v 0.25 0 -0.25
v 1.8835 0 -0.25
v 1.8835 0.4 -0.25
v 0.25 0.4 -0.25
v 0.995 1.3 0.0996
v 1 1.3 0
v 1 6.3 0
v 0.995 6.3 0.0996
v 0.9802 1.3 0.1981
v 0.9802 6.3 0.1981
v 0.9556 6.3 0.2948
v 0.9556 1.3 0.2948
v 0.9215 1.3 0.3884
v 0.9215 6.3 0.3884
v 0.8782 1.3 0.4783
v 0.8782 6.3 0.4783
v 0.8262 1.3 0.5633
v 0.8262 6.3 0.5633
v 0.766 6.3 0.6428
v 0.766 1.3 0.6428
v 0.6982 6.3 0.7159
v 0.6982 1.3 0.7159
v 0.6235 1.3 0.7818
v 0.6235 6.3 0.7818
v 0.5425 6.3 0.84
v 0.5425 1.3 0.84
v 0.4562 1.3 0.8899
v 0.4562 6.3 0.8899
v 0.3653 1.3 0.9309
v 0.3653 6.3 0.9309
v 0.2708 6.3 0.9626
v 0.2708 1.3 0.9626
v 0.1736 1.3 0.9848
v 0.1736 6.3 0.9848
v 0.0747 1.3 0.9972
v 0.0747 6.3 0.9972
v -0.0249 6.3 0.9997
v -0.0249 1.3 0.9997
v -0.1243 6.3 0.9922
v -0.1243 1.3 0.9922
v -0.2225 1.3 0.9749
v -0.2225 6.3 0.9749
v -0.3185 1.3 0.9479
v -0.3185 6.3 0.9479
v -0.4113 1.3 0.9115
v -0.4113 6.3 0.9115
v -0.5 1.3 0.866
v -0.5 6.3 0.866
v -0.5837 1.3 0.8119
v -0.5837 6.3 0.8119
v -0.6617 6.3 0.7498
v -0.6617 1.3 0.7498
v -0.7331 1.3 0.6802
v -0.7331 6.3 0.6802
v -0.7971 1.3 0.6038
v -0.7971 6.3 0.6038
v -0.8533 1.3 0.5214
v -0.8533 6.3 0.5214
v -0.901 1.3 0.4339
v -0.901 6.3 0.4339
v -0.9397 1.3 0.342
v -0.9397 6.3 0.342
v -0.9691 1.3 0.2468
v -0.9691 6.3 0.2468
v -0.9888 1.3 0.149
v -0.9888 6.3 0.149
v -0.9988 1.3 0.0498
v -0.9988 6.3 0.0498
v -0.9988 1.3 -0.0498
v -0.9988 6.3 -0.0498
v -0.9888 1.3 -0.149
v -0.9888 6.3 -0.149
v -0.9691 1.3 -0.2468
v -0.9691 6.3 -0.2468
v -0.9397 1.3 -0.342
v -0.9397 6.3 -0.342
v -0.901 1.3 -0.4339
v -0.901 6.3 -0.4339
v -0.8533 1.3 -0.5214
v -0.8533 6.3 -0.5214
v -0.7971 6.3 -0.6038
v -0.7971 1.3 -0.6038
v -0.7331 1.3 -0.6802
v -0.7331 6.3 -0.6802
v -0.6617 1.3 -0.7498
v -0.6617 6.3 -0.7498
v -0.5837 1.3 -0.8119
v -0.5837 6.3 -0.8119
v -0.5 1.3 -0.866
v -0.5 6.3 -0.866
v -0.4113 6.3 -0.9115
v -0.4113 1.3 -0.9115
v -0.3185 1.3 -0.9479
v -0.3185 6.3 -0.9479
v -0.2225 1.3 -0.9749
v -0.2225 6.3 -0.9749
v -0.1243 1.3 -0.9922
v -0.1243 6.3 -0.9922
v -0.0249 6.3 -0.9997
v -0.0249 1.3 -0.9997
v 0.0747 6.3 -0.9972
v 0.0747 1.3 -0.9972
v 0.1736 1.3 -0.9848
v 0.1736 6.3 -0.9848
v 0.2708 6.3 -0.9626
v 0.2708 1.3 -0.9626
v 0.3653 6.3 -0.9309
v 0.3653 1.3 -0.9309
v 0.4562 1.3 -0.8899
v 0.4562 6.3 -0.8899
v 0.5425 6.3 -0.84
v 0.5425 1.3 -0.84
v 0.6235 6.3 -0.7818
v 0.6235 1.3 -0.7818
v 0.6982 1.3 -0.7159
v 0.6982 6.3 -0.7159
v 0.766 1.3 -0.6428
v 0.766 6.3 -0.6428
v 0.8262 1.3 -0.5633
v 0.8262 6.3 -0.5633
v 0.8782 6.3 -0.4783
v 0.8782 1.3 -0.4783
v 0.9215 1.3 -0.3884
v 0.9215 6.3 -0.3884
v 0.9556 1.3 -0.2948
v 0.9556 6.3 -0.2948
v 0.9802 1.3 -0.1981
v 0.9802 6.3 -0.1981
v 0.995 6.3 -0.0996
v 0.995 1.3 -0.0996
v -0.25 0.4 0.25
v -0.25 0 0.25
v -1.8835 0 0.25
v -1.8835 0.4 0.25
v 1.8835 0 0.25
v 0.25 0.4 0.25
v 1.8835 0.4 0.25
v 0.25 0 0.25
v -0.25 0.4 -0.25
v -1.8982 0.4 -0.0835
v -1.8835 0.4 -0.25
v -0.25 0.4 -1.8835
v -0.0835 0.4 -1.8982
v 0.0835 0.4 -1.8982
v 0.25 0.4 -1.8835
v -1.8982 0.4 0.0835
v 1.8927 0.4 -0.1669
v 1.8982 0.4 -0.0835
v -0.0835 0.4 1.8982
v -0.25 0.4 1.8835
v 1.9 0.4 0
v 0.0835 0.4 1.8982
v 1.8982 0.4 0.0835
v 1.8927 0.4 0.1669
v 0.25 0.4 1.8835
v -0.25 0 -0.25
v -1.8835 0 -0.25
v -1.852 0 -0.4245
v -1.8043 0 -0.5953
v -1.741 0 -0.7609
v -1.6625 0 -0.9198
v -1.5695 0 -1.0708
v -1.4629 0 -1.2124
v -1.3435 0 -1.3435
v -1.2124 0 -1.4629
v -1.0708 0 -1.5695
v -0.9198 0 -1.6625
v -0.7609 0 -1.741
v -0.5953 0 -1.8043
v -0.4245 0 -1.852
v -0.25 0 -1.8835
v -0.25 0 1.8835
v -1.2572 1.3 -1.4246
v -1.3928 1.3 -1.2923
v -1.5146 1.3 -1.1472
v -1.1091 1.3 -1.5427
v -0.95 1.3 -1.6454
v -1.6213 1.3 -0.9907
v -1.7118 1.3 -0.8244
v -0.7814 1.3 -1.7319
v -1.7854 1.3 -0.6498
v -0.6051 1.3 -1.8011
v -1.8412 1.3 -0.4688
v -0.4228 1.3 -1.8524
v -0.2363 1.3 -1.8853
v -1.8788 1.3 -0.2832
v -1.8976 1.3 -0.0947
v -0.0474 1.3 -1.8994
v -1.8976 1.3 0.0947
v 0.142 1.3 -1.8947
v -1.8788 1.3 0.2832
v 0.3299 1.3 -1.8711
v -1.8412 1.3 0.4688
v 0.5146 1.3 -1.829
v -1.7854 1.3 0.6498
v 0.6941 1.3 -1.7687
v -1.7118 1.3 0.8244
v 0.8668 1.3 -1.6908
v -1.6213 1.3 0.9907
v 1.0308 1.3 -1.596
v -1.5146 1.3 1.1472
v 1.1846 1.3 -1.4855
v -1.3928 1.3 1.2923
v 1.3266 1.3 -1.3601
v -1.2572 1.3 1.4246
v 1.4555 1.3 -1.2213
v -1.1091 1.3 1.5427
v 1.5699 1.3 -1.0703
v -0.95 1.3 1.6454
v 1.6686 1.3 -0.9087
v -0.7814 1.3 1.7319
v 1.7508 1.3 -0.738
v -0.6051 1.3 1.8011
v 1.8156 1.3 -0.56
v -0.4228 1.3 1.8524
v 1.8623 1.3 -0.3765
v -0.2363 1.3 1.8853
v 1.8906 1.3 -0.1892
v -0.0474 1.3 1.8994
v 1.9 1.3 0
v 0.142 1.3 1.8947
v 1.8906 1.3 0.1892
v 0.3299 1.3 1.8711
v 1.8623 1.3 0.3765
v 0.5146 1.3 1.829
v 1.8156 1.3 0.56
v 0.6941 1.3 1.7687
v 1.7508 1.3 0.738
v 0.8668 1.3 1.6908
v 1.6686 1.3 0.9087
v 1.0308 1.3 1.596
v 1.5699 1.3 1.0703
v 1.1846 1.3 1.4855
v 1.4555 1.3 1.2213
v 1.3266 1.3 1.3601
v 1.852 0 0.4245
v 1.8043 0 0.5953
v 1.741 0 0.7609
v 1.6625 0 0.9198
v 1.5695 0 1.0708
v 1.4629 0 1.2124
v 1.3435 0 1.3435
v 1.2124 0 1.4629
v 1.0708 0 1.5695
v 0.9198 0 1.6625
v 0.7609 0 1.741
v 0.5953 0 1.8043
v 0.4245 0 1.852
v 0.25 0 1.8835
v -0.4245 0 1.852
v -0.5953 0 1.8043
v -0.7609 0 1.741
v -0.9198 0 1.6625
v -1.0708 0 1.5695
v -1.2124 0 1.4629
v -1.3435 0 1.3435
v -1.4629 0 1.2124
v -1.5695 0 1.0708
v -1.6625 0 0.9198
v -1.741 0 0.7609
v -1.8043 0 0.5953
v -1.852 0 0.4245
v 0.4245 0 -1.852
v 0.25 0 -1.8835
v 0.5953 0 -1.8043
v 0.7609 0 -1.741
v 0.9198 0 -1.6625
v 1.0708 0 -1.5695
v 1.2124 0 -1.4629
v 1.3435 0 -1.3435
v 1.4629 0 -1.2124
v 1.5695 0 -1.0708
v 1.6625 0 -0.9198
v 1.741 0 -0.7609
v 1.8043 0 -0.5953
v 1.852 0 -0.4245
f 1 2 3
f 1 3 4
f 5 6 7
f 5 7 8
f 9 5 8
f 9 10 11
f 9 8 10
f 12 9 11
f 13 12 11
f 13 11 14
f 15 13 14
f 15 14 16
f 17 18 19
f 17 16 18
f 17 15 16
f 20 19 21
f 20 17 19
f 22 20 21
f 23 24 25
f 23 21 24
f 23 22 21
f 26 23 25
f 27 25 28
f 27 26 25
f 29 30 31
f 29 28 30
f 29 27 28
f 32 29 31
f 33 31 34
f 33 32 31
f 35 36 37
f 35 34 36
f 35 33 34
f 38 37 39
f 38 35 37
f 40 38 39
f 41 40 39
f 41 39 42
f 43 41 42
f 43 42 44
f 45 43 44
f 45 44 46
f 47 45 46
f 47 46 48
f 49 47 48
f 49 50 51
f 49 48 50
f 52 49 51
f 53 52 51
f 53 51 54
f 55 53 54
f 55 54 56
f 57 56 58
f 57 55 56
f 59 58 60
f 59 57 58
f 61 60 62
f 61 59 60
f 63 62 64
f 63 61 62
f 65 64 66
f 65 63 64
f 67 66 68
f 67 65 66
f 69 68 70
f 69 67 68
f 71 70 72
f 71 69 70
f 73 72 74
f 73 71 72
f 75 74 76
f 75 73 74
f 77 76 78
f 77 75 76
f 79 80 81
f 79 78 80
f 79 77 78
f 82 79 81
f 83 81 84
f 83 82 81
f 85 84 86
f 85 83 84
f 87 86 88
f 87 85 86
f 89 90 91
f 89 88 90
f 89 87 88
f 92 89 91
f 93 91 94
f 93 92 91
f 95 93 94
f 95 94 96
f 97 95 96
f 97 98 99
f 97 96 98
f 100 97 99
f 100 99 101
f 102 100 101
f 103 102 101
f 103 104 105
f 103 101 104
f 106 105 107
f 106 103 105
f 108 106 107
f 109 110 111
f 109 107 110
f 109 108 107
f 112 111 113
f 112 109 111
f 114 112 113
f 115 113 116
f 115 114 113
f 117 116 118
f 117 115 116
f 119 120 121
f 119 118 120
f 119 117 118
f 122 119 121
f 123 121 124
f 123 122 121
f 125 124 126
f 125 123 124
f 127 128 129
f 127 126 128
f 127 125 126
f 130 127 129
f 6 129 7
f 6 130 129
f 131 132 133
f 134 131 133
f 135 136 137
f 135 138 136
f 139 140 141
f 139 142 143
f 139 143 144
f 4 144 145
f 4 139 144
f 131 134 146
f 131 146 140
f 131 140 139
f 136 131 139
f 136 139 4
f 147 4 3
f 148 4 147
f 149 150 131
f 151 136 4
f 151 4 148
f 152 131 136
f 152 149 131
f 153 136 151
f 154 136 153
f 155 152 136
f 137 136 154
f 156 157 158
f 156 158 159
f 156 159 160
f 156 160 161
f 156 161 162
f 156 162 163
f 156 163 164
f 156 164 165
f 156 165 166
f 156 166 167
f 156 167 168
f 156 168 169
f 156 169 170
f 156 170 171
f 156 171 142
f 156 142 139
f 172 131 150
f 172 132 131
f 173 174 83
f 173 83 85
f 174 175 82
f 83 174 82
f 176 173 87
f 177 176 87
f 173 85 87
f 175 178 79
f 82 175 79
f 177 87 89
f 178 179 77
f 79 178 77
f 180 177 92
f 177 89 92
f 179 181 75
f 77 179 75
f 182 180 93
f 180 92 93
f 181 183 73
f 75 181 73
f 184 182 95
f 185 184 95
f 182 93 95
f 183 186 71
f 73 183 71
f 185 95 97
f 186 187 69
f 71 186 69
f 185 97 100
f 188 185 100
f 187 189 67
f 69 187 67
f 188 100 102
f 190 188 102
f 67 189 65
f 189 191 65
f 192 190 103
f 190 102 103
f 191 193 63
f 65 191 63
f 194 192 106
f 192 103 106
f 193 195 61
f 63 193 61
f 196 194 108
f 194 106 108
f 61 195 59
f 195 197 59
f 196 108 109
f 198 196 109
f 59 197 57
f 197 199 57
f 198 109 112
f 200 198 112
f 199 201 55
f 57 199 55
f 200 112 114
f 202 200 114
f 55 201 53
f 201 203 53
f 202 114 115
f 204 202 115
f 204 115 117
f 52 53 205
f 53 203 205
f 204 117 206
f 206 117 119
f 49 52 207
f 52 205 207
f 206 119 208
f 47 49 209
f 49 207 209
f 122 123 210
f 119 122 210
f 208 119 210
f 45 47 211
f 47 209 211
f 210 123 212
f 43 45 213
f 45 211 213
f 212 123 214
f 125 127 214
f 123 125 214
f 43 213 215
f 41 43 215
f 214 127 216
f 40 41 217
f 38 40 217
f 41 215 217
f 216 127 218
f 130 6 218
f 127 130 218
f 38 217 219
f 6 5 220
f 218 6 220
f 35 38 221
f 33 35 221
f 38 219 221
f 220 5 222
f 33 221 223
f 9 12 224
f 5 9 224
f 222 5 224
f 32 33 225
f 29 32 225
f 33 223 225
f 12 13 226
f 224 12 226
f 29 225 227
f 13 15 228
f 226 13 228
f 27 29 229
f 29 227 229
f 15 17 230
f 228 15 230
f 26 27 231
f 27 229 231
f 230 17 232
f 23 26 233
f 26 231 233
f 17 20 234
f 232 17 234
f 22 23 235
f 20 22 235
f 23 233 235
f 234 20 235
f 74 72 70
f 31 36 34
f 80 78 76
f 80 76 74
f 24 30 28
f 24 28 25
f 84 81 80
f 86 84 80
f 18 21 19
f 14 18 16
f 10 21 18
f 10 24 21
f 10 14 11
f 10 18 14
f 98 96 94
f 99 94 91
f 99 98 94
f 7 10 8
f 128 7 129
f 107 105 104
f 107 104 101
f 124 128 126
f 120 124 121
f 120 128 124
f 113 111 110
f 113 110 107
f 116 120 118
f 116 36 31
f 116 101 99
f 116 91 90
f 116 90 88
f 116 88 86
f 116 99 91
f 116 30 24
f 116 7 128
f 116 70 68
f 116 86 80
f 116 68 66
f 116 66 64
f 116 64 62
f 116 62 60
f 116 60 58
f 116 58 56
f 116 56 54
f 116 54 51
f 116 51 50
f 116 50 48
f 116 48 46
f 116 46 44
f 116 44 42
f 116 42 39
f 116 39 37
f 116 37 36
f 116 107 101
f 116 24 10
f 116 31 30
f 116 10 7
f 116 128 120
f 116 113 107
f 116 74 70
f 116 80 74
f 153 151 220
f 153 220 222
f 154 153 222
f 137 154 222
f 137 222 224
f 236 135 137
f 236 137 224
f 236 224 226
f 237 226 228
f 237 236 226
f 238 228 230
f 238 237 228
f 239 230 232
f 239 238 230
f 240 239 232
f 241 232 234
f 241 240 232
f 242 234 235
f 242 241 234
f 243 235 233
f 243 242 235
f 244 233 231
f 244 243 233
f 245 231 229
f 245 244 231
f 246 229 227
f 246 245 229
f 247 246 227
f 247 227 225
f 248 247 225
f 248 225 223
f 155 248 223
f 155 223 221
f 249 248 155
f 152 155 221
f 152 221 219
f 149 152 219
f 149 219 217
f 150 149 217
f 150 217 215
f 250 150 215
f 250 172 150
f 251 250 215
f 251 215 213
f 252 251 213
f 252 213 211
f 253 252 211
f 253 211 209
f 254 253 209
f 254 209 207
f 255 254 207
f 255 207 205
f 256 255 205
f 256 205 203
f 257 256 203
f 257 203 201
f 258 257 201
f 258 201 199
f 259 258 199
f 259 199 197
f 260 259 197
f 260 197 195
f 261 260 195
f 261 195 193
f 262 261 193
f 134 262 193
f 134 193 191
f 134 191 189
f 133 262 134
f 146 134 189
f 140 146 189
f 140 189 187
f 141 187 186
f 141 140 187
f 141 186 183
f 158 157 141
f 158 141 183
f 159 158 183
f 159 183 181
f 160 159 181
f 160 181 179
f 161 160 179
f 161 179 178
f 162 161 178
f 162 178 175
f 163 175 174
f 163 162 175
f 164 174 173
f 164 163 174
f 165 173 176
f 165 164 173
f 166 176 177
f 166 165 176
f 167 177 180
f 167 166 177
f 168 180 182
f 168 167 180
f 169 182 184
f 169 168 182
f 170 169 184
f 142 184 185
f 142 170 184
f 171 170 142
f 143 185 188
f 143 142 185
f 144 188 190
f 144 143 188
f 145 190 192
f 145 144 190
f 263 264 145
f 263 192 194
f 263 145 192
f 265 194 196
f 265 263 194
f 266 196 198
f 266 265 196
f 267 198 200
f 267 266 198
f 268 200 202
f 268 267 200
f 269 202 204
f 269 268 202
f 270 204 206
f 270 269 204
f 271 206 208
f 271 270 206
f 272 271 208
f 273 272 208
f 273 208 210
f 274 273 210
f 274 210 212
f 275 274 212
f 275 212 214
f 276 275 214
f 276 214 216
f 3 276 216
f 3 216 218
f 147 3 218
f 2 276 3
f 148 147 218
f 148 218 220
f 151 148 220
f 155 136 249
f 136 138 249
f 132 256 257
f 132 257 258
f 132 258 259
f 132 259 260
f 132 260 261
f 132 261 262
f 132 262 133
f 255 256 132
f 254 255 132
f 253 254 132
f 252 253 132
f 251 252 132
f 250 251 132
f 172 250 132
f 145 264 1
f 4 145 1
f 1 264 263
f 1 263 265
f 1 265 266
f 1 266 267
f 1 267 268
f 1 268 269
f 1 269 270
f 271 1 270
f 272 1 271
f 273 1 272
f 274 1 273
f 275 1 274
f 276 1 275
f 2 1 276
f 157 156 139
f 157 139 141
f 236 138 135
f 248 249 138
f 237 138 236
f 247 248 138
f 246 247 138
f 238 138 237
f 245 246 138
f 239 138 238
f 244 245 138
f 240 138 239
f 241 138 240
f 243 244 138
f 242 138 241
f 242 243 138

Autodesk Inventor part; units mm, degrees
ref_plane "Work Plane4" through (0, 0, 0) normal (0, -1, 0) x (1, 0, 0)
sketch "Sketch2" plane through (0, 0, 0) normal (0, -1, 0) x (1, 0, 0)
  circle A0 centre (0, 0) radius 1.9
  dimension "d34" = 3.8
extrude "Extrusion4" add sketch "Sketch2" against normal blind 1.3
ref_plane "Work Plane2" through (0, 0, 0) normal (0, -1, 0) x (1, 0, 0)
sketch "Sketch4" plane through (0, 0, 0) normal (0, -1, 0) x (1, 0, 0)
  arc A0 (-0.25, -1.8835) -> (0.25, -1.8835) centre (0, 0) ccw
  arc A1 (0.25, 1.8835) -> (-0.25, 1.8835) centre (0, 0) ccw
  line L0 (0.25, 0.25) -> (1.8835, 0.25)
  line L1 (-0.25, 0.25) -> (-1.8835, 0.25)
  arc A2 (-0.25, -1.8835) -> (0.25, -1.8835) centre (0, 0) ccw
  arc A3 (1.8835, -0.25) -> (1.8835, 0.25) centre (0, 0) ccw
  arc A4 (0.25, 1.8835) -> (-0.25, 1.8835) centre (0, 0) ccw
  arc A5 (-1.8835, 0.25) -> (-1.8835, -0.25) centre (0, 0) ccw
  line L2 (1.8835, -0.25) -> (0.25, -0.25)
  line L3 (-0.25, -0.25) -> (-1.8835, -0.25)
  line L4 (-0.25, -1.8835) -> (-0.25, -0.25)
  line L5 (-0.25, 0.25) -> (-0.25, 1.8835)
  line L6 (0.25, -1.8835) -> (0.25, -0.25)
  line L7 (0.25, 0.25) -> (0.25, 1.8835)
extrude "Extrusion5" cut sketch "Sketch4" against normal blind 0.4
ref_plane "Work Plane5" through (0, 1.6, 0) normal (0, 1, 0) x (1, 0, 0)
ref_plane "Work Plane6" through (0, 1.3, 0) normal (0, 1, 0) x (1, 0, 0)
sketch "Sketch6" plane through (0, 1.3, 0) normal (0, 1, 0) x (1, 0, 0)
  circle A0 centre (0, 0) radius 1
  dimension "d35" = 2
extrude "Extrusion7" add sketch "Sketch6" along normal blind 5
thread "Thread4" size "M2x0.4" class "6g" standard "ANSI Metric M Profile" full length
properties part number "M2x6_D963"
